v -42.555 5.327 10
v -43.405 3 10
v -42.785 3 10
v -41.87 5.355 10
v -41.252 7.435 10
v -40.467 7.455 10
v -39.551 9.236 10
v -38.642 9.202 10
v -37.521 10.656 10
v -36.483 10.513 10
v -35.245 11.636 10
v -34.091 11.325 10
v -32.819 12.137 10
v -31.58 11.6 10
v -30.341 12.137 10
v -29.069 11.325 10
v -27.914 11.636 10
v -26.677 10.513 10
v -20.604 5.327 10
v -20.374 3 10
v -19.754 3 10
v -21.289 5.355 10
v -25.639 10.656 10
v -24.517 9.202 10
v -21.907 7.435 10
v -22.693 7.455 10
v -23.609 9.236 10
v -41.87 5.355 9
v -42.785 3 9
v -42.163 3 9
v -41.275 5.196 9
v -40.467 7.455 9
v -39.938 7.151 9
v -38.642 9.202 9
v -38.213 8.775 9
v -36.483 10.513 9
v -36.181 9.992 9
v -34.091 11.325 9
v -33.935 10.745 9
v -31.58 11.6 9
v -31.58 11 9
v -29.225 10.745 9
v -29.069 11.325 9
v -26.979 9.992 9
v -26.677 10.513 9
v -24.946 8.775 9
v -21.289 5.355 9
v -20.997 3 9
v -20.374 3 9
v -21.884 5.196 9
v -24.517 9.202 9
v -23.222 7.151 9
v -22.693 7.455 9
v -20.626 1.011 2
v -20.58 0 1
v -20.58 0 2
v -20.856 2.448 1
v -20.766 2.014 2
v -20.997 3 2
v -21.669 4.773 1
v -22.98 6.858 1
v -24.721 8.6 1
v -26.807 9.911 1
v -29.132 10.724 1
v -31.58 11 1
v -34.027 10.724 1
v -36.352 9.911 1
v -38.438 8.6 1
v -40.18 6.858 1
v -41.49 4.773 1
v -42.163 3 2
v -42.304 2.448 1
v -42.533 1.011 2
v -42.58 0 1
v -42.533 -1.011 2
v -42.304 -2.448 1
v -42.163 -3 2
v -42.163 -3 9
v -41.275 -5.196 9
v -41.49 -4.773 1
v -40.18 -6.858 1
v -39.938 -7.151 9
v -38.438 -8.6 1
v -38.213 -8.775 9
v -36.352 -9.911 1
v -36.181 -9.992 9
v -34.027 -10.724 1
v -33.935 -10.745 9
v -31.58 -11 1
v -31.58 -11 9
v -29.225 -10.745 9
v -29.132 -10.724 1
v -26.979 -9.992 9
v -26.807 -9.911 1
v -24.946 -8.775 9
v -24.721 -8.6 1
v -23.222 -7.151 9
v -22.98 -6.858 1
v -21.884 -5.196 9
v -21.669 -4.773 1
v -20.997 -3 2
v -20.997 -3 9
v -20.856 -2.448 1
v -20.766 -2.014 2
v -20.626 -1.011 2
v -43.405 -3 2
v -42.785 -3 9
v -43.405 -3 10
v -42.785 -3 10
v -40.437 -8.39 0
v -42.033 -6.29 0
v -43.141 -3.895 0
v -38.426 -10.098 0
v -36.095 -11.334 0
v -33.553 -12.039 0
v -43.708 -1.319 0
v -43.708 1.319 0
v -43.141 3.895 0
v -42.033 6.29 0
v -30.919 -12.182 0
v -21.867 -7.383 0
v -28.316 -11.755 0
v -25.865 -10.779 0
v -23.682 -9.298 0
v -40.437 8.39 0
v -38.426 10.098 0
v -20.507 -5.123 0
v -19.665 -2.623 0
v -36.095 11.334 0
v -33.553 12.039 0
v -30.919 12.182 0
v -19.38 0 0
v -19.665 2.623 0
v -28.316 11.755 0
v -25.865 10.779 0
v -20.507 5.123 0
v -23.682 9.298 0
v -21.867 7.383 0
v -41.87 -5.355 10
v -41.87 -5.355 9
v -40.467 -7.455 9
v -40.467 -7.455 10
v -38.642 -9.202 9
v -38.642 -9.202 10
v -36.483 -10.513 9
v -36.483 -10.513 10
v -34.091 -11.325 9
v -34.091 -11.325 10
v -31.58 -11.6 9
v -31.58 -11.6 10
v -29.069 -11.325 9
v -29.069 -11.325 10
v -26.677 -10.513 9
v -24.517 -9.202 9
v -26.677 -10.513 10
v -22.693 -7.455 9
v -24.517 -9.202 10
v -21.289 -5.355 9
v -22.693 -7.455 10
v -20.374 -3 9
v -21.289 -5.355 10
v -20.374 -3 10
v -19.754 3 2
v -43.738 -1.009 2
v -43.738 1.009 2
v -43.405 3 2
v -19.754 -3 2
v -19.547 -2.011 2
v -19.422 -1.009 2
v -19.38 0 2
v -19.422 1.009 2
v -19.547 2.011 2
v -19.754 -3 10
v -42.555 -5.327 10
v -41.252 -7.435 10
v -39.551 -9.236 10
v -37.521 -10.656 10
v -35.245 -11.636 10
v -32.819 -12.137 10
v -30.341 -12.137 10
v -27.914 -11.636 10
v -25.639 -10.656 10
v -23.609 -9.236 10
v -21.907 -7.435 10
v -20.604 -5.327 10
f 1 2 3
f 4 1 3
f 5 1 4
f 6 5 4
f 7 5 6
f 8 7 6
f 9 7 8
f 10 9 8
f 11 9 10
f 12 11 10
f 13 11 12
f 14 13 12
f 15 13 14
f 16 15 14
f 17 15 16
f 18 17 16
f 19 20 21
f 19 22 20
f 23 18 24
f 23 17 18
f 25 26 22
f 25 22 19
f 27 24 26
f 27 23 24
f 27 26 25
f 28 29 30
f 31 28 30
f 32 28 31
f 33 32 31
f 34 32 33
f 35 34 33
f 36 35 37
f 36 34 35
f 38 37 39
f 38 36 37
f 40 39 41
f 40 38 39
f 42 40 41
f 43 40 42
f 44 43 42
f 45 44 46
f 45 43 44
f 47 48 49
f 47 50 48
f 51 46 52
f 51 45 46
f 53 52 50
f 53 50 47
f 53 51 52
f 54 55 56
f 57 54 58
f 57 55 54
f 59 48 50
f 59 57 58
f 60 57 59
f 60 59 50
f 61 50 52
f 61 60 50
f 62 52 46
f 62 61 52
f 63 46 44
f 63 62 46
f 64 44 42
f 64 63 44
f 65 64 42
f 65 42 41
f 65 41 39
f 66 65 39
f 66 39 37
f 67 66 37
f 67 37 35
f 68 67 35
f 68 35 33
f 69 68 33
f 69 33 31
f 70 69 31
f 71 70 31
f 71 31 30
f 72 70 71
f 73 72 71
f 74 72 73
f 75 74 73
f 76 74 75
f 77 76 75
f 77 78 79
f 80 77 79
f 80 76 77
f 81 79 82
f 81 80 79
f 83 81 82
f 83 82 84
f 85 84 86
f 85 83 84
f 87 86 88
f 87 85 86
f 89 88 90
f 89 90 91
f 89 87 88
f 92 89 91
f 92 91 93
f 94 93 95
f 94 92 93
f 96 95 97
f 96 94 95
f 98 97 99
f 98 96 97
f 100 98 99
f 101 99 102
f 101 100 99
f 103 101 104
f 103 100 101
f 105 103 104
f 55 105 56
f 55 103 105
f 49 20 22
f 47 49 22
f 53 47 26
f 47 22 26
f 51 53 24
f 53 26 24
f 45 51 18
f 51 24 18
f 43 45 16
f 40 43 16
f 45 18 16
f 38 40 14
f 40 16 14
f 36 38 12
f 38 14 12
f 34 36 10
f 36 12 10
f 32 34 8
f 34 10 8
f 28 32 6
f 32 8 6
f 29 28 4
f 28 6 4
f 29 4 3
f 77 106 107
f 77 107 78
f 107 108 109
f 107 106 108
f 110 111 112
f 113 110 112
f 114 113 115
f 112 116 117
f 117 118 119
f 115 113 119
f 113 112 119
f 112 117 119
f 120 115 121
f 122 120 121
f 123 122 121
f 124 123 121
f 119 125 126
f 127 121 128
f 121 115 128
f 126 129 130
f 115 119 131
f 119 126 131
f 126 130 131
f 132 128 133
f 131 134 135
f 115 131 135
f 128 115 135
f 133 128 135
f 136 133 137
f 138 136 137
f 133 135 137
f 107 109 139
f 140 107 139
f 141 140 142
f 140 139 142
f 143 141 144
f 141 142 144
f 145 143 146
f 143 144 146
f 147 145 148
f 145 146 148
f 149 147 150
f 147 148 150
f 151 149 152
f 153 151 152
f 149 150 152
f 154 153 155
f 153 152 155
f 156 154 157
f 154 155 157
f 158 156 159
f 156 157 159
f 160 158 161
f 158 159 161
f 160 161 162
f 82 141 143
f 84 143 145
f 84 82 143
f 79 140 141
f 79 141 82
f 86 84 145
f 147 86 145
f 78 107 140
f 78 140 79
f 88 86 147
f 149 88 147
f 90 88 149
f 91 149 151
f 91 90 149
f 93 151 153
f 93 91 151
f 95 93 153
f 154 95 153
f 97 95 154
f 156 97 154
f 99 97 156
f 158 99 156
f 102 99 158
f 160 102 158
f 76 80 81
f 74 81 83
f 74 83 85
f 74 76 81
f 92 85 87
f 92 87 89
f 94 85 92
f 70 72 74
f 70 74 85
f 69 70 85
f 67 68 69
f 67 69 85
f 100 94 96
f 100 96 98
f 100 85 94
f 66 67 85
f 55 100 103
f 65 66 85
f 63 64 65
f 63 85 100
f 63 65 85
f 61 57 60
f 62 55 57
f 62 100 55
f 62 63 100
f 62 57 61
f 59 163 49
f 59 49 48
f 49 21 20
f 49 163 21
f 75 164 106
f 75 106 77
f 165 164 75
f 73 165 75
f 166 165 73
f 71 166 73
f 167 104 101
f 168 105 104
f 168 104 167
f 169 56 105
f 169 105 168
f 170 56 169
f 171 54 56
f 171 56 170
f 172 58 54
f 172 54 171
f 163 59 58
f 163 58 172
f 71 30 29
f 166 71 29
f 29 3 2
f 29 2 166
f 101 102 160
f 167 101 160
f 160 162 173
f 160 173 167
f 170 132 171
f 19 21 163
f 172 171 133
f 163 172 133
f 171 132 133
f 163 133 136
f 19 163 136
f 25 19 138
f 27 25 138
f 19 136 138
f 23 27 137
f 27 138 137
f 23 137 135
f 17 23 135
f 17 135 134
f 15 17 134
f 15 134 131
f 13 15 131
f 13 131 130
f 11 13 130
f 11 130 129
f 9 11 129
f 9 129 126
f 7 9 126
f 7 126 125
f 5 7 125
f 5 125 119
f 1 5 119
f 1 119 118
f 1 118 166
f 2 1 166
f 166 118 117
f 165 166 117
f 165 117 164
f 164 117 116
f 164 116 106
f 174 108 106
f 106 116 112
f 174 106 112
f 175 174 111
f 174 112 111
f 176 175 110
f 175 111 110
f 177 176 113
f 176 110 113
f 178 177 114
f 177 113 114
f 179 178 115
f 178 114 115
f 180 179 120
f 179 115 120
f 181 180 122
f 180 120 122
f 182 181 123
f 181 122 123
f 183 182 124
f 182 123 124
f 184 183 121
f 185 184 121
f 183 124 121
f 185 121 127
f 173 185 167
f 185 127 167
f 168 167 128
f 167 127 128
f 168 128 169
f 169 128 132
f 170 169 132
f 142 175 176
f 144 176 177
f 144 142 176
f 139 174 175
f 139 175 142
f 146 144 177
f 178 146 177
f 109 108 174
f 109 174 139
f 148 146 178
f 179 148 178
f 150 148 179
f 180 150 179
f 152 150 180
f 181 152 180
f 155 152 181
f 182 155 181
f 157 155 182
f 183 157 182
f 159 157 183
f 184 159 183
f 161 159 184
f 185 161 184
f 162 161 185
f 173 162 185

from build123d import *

# Parameters (mm, degrees)
F0_R     = 11
F1_DEPTH = 1
F0_R_2   = 12.2
F2_DEPTH = 10
F3_R     = 11.6
F3_R_2   = 11
F4_DEPTH = 1
F6_DEPTH = 8


with BuildPart() as f1:
    # F0 (on Top) → F1 (new body)
    with BuildSketch(Plane.XY):
        with Locations((-31.5797176751, 0)):
            Circle(F0_R)
    extrude(amount=F1_DEPTH)

    # F0 (on Top) → F2 (join)
    with BuildSketch(Plane.XY):
        with Locations((-31.5797176751, 0)):
            Circle(F0_R_2)
        with Locations((-31.5797176751, 0)):
            Circle(F0_R, mode=Mode.SUBTRACT)
    extrude(amount=F2_DEPTH)

    # F3 (on face) → F4 (cut)
    with BuildSketch(Plane.XY.offset(10)):
        with Locations((-31.5797176751, 0)):
            Circle(F3_R)
        with Locations((-31.5797176751, 0)):
            Circle(F3_R_2, mode=Mode.SUBTRACT)
    extrude(amount=-F4_DEPTH, mode=Mode.SUBTRACT)

    # F5 (on face) → F6 (cut)
    with BuildSketch(Plane.XY.offset(10)):
        with BuildLine():
            ThreePointArc((-19.3797176751, 0), (-19.4737308076, 1.511648757), (-19.7543212758, 3))
            Line((-19.7543212758, 3), (-20.3743618128, 3))
            ThreePointArc((-20.3743618128, 3), (-20.0788018854, 1.5129229983), (-19.9797176751, 0))
            ThreePointArc((-19.9797176751, 0), (-20.0788018854, -1.5129229983), (-20.3743618128, -3))
            Line((-20.3743618128, -3), (-19.7543212758, -3))
            ThreePointArc((-19.7543212758, -3), (-19.4737308076, -1.511648757), (-19.3797176751, 0))
        make_face()
        with BuildLine():
            Line((-20.3743618128, 3), (-42.7850735373, 3))
            ThreePointArc((-42.7850735373, 3), (-43.1797176751, 0), (-42.7850735373, -3))
            Line((-42.7850735373, -3), (-20.3743618128, -3))
            ThreePointArc((-20.3743618128, -3), (-20.0788018854, -1.5129229983), (-19.9797176751, 0))
            ThreePointArc((-19.9797176751, 0), (-20.0788018854, 1.5129229983), (-20.3743618128, 3))
        make_face()
        with BuildLine():
            Line((-42.7850735373, 3), (-43.4051140743, 3))
            ThreePointArc((-43.4051140743, 3), (-43.7797176751, 0), (-43.4051140743, -3))
            Line((-43.4051140743, -3), (-42.7850735373, -3))
            ThreePointArc((-42.7850735373, -3), (-43.1797176751, 0), (-42.7850735373, 3))
        make_face()
    extrude(amount=-F6_DEPTH, mode=Mode.SUBTRACT)


solid = f1.part
